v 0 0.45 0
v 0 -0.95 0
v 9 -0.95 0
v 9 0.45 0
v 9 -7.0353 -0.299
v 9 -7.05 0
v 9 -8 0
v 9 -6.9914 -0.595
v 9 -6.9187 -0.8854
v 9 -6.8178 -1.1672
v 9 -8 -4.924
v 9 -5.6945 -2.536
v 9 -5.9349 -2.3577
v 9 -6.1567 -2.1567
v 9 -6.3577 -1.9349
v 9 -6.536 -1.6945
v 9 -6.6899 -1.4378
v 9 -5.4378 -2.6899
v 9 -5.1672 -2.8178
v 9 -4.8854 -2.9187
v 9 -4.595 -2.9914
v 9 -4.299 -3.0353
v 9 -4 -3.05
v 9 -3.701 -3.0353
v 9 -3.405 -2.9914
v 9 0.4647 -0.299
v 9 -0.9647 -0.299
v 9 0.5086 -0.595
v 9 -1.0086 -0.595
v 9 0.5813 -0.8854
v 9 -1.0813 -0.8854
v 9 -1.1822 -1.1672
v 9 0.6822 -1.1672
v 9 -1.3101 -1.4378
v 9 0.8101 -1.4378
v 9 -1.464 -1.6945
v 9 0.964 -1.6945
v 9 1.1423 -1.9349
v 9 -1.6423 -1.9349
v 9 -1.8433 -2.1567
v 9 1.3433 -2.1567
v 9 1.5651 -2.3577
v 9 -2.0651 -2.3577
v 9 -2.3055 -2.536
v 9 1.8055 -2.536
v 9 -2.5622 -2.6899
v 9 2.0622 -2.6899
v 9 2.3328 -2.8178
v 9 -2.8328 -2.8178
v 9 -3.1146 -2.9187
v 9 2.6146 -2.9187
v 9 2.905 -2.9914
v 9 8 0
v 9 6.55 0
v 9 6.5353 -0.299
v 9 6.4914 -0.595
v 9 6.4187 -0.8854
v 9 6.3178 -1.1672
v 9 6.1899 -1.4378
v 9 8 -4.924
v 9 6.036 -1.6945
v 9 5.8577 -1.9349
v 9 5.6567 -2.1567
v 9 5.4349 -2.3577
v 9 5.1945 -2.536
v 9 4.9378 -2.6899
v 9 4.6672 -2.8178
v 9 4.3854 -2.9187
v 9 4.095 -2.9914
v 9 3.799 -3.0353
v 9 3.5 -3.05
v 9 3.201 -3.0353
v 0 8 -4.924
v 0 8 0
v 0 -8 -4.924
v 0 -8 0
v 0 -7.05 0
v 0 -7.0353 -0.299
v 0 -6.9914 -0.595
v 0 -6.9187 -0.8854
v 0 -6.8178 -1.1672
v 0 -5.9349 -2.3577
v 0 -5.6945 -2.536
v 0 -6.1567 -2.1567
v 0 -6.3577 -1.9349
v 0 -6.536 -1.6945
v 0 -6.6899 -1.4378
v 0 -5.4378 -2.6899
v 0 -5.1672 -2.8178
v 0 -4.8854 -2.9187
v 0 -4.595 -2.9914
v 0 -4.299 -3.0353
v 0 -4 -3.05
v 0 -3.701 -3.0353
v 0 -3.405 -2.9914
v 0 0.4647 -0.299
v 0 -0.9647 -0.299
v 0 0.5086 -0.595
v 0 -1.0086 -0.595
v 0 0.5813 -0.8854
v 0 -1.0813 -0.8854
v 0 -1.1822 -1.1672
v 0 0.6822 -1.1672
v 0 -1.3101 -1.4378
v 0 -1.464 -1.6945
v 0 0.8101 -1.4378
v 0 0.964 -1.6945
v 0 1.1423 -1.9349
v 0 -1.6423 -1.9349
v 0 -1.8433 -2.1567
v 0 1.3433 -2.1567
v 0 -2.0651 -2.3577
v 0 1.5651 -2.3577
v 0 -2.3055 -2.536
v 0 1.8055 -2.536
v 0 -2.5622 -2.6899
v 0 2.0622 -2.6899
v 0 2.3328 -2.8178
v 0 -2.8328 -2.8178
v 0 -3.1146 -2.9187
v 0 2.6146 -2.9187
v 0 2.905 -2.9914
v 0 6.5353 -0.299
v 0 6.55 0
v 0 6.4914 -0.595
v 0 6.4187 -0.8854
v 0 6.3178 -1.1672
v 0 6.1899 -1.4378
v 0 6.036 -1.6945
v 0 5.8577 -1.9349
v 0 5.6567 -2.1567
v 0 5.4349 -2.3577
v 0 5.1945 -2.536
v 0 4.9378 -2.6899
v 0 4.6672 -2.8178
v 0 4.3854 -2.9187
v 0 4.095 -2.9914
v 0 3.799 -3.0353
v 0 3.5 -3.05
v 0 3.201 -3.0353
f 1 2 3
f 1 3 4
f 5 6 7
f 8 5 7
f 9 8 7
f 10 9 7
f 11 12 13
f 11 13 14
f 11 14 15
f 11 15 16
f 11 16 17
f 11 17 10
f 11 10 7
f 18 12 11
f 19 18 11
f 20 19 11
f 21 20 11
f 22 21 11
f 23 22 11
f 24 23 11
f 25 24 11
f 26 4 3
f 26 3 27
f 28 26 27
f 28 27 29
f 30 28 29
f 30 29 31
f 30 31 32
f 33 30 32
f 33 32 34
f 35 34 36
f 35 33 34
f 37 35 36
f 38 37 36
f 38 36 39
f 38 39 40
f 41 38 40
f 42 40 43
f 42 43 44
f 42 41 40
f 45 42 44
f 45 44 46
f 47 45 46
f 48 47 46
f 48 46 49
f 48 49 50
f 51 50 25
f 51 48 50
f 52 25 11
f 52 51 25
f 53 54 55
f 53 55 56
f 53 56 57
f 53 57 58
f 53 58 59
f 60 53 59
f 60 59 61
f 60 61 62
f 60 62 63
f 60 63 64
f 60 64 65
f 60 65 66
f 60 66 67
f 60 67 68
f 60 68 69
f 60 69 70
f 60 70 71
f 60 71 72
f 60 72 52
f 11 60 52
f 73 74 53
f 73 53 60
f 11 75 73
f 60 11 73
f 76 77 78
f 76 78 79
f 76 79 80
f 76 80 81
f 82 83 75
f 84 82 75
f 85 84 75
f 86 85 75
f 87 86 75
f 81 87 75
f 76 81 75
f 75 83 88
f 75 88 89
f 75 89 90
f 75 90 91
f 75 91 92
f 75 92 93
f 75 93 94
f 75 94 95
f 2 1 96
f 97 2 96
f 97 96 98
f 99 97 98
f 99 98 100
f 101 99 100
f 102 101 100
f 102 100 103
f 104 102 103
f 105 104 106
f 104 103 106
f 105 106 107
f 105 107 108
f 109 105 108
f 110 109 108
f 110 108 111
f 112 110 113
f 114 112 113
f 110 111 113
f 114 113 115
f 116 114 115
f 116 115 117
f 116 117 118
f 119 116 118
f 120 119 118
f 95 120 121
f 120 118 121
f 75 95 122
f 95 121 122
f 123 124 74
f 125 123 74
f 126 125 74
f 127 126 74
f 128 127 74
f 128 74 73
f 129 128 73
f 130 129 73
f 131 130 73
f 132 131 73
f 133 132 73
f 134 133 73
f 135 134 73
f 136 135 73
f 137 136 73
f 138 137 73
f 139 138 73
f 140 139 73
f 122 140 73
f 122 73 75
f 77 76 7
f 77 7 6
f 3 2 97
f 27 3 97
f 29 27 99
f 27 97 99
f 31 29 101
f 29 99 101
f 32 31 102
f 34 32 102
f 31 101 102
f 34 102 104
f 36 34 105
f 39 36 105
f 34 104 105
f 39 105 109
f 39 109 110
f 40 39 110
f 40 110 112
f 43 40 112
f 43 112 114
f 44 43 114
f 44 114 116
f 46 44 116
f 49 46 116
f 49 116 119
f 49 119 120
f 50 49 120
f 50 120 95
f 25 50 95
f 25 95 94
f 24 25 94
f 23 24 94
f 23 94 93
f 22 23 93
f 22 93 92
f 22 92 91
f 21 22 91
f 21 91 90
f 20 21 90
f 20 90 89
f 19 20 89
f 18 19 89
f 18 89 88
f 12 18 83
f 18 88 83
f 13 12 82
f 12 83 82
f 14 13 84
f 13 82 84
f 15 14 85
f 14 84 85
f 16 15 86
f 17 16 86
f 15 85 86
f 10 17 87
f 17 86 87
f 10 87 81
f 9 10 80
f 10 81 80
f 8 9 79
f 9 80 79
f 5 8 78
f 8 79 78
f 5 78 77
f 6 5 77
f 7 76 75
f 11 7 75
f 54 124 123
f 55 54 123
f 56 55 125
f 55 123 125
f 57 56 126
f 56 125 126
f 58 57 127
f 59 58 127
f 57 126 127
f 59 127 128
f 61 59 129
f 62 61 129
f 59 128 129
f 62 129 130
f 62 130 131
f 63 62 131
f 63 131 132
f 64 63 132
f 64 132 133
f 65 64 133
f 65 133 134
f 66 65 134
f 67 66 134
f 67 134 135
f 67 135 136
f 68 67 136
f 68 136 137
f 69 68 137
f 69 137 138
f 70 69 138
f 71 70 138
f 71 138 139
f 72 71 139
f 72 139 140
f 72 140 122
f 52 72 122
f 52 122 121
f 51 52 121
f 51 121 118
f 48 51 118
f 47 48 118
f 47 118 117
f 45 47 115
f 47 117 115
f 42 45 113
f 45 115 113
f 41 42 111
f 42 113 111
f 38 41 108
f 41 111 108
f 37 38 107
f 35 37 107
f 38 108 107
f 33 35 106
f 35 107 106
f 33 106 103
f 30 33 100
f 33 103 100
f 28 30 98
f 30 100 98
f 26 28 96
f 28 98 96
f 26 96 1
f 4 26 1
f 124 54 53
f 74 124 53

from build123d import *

# Parameters (mm, degrees)
SKETCH1_W           = 9.848024316
SKETCH1_H           = 16
BOSS_EXTRUDE1_DEPTH = 9
SKETCH3_R           = 3.05
CUT_EXTRUDE1_DEPTH  = 9
SKETCH4_W           = 8.110790477
SKETCH4_H           = 20.153934792
CUT_EXTRUDE2_DEPTH  = 9


with BuildPart() as part:
    # Sketch1 → Boss-Extrude1 (new body)
    with BuildSketch(Plane(origin=(0, 0, 0), x_dir=(0, 0, -1), z_dir=(1, 0, 0))):
        Rectangle(SKETCH1_W, SKETCH1_H)
    extrude(amount=BOSS_EXTRUDE1_DEPTH)

    # Sketch3 → Cut-Extrude1 (cut)
    with BuildSketch(Plane.ZY):
        with Locations((0, 3.5)):
            Circle(SKETCH3_R)
        with Locations((0, -4)):
            Circle(SKETCH3_R)
    extrude(amount=-CUT_EXTRUDE1_DEPTH, mode=Mode.SUBTRACT)

    # Sketch4 → Cut-Extrude2 (cut)
    with BuildSketch(Plane.ZY):
        with Locations((4.055395239, 0)):
            Rectangle(SKETCH4_W, SKETCH4_H)
    extrude(amount=-CUT_EXTRUDE2_DEPTH, mode=Mode.SUBTRACT)


solid = part.part
